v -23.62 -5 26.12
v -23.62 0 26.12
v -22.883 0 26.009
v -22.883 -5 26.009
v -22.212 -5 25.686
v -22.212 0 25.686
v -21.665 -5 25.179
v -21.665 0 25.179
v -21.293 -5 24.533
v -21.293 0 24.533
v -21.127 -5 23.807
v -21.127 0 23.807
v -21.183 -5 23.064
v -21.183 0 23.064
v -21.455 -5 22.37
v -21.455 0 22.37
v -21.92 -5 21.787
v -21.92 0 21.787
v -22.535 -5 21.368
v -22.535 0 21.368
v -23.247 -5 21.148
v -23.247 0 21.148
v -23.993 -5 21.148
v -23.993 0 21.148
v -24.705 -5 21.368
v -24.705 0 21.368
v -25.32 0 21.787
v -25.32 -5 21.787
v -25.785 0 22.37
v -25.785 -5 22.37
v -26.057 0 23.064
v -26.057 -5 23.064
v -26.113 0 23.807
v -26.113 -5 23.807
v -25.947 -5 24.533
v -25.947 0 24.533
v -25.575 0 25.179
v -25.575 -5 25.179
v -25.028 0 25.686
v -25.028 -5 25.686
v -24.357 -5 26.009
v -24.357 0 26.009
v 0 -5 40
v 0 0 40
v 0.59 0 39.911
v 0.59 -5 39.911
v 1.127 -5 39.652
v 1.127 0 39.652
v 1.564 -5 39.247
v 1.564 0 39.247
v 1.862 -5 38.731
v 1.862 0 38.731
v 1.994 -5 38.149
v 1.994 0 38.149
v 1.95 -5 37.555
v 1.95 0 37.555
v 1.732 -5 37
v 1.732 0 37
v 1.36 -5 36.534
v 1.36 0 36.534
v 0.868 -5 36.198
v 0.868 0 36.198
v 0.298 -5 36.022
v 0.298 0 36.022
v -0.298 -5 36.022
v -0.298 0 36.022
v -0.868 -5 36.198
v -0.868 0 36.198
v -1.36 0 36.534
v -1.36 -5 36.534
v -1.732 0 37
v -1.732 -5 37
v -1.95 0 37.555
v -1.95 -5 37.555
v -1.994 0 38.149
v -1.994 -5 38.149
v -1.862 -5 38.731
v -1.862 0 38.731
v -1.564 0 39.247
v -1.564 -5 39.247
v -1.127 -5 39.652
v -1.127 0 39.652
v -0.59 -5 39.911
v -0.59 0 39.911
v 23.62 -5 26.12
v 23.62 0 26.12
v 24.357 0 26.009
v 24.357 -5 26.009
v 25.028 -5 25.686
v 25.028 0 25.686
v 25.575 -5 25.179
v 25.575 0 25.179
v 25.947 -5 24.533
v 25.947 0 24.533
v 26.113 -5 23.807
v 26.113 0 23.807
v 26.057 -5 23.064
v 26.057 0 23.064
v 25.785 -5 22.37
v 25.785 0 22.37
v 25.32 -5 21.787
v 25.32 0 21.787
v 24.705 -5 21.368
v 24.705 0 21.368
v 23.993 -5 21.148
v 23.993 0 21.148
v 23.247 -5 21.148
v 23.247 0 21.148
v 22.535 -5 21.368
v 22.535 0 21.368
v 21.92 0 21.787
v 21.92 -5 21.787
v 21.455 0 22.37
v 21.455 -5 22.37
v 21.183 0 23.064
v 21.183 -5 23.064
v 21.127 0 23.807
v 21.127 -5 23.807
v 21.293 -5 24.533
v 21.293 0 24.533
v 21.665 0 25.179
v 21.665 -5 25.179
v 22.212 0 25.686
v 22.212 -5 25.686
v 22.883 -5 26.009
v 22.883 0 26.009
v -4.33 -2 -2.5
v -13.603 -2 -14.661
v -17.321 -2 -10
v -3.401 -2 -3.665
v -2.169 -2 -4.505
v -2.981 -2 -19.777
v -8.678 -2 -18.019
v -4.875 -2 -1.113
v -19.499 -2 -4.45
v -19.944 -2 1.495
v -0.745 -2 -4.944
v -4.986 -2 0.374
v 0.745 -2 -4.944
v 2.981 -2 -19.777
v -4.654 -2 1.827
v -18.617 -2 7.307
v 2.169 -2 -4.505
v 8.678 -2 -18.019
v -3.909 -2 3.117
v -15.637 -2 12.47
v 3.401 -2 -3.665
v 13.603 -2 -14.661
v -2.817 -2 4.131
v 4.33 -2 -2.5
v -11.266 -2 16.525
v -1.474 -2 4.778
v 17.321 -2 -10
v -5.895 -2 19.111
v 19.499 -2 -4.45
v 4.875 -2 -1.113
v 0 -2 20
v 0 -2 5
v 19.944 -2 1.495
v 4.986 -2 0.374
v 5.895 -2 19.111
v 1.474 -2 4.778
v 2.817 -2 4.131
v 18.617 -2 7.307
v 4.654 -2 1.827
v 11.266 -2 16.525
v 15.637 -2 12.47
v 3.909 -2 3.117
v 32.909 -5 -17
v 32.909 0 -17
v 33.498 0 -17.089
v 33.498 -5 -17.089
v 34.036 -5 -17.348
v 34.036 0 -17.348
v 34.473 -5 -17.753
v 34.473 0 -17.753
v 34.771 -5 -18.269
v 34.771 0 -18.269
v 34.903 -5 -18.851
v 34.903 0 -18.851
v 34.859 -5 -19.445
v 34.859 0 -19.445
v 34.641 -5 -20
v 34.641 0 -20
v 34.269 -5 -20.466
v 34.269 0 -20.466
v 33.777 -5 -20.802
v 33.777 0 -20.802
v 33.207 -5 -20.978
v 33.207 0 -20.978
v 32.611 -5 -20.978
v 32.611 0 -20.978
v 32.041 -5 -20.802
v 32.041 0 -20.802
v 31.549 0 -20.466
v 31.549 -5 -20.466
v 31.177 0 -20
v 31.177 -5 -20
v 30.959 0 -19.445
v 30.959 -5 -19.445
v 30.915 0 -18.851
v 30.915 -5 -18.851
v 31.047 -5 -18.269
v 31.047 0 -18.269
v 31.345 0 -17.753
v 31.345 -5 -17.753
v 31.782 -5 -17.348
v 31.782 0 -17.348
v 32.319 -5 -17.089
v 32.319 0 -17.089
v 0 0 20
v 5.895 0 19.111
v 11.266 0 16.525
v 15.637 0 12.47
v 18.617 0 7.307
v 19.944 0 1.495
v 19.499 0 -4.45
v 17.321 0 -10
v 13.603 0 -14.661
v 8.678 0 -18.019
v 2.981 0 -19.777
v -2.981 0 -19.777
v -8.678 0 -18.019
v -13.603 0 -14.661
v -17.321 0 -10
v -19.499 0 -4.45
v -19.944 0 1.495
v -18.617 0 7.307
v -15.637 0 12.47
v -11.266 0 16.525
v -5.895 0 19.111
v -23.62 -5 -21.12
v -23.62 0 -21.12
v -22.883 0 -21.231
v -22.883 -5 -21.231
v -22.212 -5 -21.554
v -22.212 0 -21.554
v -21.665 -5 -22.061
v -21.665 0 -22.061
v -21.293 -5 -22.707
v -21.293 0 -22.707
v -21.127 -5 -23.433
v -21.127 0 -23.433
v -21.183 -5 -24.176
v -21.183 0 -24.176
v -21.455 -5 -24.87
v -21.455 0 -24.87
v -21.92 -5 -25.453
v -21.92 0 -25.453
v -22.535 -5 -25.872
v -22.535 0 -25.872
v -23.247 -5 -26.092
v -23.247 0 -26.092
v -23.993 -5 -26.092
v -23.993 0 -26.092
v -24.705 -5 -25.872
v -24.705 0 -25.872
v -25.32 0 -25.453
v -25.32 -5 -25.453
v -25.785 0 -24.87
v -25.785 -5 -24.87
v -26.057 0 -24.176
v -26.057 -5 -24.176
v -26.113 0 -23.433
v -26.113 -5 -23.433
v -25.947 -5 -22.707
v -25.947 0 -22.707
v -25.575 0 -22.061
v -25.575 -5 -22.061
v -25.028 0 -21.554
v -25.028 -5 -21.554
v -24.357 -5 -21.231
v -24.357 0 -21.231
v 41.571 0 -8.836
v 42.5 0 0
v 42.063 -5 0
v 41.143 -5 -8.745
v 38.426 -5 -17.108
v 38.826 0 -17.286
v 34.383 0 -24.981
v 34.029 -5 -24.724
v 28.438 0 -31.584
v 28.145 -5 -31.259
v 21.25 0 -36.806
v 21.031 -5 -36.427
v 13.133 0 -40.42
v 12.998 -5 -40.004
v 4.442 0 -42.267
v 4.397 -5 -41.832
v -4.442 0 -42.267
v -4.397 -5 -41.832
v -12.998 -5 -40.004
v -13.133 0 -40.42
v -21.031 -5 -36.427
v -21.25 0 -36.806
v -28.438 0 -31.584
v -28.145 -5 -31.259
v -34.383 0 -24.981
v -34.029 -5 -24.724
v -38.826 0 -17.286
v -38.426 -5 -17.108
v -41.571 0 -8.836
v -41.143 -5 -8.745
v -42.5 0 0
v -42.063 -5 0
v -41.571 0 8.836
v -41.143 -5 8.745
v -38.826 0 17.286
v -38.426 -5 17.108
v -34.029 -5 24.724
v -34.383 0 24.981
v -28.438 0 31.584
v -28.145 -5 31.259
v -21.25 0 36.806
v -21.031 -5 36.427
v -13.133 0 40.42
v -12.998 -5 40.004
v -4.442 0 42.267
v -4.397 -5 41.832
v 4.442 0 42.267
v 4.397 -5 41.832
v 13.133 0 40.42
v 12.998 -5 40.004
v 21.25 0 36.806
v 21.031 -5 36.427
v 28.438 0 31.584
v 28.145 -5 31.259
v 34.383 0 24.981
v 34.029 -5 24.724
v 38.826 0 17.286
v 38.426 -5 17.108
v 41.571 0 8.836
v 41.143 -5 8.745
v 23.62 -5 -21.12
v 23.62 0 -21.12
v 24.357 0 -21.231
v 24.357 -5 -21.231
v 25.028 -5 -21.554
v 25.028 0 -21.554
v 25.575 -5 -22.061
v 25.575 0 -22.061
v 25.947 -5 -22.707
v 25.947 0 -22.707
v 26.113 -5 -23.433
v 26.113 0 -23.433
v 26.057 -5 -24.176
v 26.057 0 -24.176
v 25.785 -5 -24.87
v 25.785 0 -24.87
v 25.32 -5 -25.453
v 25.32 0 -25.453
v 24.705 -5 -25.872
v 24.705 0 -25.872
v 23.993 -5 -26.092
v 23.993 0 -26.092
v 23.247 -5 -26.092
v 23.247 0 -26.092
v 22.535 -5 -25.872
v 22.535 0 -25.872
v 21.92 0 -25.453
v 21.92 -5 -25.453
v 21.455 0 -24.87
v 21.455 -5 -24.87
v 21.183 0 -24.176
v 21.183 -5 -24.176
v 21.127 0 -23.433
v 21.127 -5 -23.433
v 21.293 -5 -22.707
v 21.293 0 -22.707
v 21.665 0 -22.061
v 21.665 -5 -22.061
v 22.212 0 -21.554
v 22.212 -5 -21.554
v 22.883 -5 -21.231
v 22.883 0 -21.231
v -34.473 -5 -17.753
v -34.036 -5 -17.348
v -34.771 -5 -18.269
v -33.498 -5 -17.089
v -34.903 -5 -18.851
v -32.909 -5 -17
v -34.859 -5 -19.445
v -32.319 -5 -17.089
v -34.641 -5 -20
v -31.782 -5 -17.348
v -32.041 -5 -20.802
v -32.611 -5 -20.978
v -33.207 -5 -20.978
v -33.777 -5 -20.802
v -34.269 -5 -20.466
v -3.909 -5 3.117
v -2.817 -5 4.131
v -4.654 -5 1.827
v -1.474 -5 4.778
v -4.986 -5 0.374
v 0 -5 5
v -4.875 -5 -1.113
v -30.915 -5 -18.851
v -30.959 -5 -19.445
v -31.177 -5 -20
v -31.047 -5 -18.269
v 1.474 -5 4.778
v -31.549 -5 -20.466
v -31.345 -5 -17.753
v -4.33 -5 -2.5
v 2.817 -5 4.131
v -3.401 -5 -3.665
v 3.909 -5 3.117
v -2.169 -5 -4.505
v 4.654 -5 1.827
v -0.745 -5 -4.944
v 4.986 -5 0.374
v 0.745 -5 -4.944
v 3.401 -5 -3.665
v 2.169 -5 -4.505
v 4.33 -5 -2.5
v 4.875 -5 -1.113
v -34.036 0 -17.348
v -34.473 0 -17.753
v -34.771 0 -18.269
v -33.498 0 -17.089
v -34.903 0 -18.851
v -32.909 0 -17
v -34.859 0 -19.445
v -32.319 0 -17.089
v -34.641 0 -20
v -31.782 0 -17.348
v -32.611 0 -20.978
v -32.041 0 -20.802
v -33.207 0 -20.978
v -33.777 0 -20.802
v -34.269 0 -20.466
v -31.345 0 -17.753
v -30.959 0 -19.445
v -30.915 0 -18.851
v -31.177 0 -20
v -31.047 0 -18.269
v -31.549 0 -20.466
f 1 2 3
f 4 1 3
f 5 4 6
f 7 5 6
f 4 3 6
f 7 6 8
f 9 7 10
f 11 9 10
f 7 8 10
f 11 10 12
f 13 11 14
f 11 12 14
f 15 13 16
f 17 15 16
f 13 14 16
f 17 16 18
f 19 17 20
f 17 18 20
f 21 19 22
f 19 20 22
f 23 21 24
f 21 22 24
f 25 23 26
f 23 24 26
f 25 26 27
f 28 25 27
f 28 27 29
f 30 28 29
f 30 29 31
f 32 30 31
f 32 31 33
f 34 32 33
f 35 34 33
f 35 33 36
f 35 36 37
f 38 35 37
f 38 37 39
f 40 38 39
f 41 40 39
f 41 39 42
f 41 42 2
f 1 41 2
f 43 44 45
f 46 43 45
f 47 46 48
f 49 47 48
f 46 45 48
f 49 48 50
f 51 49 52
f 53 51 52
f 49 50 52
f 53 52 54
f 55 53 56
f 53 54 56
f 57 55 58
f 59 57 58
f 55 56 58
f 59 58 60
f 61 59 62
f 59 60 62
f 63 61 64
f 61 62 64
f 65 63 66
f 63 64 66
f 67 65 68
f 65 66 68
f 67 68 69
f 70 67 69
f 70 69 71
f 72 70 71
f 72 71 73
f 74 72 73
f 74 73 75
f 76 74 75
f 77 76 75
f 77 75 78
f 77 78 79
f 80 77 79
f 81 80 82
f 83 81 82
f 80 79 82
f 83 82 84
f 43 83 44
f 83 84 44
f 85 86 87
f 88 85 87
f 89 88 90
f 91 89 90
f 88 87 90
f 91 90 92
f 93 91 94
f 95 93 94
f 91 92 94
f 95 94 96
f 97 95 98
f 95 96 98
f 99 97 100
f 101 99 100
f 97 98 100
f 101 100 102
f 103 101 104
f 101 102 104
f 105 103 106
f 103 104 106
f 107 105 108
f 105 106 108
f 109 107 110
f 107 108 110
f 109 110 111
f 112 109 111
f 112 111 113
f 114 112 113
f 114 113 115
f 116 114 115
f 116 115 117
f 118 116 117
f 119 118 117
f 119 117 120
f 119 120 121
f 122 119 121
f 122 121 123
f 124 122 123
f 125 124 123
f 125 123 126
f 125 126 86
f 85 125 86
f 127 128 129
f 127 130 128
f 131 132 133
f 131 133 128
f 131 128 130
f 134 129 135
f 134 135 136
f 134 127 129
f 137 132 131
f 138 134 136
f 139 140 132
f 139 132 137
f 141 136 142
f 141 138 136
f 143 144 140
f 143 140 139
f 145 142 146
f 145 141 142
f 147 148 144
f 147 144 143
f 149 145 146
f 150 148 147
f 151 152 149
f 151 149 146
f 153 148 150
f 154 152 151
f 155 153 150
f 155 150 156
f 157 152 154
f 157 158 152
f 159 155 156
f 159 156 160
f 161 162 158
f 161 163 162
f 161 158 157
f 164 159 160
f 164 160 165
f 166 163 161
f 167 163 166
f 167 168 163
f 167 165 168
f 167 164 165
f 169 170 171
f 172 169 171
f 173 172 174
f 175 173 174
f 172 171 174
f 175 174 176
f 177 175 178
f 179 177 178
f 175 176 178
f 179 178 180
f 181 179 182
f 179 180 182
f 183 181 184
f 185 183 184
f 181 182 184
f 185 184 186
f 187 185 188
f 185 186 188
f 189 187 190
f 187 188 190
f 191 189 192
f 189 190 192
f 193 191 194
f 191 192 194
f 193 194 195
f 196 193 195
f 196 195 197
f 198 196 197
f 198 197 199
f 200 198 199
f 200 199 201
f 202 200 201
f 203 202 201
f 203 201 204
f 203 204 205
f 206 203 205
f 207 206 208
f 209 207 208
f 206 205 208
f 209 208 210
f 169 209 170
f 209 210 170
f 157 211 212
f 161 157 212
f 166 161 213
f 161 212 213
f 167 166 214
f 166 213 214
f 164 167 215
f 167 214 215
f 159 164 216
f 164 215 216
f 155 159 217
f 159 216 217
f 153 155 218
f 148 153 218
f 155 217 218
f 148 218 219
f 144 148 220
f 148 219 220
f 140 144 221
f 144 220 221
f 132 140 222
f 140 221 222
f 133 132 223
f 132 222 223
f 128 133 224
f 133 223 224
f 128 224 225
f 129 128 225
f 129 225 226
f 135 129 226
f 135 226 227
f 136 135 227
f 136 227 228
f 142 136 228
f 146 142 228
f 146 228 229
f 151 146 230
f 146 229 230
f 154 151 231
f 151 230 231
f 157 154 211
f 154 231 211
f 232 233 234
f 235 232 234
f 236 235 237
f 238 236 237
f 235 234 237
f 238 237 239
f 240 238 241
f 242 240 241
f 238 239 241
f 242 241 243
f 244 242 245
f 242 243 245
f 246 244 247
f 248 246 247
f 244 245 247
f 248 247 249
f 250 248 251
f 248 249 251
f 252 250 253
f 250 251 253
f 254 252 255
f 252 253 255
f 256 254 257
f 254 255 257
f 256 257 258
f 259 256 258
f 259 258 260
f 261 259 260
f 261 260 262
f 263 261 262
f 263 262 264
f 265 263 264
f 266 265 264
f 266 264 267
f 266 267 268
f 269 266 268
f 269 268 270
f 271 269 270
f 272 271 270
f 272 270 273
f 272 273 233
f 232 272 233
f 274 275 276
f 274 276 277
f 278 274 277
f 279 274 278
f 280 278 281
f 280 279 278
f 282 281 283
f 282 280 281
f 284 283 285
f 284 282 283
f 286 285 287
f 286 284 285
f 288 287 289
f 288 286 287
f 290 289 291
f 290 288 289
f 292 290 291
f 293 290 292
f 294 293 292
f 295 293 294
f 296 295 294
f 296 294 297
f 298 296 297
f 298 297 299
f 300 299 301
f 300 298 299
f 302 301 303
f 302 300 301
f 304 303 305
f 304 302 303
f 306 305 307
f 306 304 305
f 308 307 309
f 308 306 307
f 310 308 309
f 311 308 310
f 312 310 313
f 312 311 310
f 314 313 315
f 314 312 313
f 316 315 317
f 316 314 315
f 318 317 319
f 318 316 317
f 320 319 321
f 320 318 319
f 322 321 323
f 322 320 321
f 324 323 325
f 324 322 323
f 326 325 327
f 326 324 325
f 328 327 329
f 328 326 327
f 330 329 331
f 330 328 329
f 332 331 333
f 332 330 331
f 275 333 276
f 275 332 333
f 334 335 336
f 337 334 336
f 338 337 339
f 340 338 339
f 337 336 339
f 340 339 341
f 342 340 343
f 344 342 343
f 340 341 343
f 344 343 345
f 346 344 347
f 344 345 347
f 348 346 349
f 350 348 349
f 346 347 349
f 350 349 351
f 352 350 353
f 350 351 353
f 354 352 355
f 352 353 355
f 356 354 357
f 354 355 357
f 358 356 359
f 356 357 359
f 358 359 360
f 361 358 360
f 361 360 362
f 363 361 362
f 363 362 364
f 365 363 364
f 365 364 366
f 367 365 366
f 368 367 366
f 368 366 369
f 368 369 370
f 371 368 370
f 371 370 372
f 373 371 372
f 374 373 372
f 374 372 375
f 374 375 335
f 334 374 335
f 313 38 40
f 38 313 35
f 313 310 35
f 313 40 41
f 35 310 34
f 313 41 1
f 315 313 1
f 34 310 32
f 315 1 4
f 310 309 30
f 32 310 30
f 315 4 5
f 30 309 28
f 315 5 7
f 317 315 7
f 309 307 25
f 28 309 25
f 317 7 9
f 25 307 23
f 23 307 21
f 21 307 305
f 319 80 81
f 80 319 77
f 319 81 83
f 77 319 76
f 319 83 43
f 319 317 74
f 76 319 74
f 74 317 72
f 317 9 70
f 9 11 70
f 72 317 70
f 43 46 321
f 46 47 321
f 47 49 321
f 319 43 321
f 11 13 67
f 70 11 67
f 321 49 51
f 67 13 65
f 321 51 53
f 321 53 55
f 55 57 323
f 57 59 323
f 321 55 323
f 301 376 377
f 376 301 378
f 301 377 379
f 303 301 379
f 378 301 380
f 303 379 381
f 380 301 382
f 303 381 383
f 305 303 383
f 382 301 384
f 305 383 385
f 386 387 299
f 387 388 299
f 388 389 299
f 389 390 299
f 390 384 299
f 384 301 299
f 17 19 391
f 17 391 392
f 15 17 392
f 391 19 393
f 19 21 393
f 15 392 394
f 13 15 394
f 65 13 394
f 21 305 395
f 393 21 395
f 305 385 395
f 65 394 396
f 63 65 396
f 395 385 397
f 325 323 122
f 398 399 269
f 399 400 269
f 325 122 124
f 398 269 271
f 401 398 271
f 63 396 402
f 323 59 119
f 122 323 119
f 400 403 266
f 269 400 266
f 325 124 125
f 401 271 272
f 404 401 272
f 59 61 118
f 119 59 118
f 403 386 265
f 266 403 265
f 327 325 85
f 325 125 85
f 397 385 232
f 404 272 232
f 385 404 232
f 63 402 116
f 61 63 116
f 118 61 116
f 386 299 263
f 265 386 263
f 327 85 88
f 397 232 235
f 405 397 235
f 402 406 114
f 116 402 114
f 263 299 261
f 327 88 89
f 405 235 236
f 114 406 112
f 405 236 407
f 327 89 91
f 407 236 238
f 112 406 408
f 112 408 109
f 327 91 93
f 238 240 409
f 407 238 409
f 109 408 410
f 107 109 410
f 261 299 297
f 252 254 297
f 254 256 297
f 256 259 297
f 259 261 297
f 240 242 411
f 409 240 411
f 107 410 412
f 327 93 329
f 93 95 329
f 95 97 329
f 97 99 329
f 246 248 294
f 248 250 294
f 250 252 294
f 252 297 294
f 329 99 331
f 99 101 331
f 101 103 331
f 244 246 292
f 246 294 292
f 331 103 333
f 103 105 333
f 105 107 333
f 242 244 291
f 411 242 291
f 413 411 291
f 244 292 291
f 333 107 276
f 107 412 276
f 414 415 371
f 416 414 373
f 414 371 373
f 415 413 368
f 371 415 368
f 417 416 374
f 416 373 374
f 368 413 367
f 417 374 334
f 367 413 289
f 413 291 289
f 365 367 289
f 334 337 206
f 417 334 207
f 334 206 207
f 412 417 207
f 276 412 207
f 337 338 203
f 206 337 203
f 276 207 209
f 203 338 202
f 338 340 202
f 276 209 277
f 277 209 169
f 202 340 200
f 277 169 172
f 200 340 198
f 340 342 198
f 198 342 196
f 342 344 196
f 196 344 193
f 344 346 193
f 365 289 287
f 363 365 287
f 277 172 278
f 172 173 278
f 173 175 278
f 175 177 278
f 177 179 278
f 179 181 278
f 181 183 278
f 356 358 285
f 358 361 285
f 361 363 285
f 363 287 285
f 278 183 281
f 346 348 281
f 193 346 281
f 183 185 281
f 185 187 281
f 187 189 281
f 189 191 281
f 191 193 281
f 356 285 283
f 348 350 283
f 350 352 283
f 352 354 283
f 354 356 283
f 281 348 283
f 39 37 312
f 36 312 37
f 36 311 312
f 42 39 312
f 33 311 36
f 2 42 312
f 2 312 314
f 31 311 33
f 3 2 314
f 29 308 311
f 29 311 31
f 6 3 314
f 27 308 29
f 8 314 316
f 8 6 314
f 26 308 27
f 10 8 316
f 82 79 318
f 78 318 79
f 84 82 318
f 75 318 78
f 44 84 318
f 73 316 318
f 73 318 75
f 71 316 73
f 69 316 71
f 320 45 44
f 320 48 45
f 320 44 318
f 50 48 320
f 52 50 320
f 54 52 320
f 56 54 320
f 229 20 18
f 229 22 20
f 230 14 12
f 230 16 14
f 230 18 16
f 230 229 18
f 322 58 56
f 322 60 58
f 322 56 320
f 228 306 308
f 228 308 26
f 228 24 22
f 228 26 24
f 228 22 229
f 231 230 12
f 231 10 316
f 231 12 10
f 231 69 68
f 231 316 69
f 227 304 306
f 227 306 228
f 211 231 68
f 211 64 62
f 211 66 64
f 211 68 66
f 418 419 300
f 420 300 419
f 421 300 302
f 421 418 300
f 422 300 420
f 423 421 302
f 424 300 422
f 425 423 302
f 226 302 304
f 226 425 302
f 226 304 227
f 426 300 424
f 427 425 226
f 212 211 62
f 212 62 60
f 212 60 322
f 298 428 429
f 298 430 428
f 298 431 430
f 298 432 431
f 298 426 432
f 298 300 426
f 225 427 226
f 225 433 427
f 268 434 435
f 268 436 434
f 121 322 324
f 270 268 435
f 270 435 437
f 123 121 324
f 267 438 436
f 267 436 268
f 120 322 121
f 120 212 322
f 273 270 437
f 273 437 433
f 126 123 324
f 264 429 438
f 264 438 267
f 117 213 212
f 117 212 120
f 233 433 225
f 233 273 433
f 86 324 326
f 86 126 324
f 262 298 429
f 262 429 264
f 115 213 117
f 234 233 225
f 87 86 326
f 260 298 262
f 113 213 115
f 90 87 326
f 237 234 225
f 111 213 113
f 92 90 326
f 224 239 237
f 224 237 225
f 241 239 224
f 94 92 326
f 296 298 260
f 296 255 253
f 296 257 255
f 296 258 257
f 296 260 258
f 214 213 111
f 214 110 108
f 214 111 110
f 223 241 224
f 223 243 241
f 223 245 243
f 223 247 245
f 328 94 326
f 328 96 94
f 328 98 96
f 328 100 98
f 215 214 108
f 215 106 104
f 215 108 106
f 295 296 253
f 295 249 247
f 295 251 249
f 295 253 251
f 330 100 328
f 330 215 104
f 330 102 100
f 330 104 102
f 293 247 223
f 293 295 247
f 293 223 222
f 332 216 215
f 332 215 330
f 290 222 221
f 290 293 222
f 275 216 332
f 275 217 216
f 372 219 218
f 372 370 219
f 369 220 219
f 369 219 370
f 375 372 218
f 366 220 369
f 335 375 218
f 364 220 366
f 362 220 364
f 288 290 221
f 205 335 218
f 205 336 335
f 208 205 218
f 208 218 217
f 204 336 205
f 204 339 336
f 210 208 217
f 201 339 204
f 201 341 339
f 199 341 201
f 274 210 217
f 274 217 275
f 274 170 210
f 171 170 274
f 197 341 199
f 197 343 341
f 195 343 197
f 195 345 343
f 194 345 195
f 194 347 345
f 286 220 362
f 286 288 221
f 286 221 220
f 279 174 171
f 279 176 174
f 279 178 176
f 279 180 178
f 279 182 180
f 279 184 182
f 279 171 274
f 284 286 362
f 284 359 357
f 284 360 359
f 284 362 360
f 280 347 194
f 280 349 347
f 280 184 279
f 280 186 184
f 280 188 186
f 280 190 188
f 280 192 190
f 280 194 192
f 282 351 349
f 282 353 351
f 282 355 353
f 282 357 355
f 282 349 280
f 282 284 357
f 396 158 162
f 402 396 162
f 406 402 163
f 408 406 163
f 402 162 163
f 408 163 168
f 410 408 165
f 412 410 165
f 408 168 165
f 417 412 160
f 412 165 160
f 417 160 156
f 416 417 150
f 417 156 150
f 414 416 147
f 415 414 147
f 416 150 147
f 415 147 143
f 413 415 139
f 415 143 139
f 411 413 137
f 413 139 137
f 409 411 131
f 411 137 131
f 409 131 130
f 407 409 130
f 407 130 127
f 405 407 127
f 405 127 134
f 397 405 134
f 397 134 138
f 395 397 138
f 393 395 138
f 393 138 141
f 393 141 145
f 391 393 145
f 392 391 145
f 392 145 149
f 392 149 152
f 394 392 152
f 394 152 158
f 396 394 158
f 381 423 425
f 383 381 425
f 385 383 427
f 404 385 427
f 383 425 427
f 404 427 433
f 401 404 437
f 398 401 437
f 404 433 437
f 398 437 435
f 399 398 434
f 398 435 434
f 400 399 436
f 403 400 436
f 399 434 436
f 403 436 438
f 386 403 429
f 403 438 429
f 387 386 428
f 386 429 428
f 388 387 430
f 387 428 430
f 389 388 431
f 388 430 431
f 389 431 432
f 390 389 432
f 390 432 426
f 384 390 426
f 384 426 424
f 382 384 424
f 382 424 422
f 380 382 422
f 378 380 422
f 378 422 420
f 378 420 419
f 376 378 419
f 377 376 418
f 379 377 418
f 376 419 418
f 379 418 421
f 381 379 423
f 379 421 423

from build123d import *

# Parameters (mm, degrees)
SKETCH1_R           = 42.5
BOSS_EXTRUDE1_DEPTH = 5
BOSS_EXTRUDE1_DRAFT = -5
SKETCH2_R           = 2.5
SKETCH2_R_2         = 5
CUT_EXTRUDE2_DEPTH  = 61.311690409
SKETCH3_R           = 20
CUT_EXTRUDE3_DEPTH  = 2
SKETCH5_R           = 2
CUT_EXTRUDE4_DEPTH  = 5


with BuildPart() as part:
    # Sketch1 → Boss-Extrude1 (with draft: the straight prism first)
    with BuildSketch(Plane(origin=(0, 0, 0), x_dir=(1, 0, 0), z_dir=(0, 1, 0))):
        Circle(SKETCH1_R)
    extrude(amount=-BOSS_EXTRUDE1_DEPTH)
    # Boss-Extrude1: the draft: its side faces are tilted about the plane it starts from
    boss_extrude1_sides = [part.faces().sort_by_distance(p)[0] for p in [
        (-42.5, -2.5, 0),
    ]]
    draft(boss_extrude1_sides, Plane(origin=(0, 0, 0), x_dir=(1, 0, 0), z_dir=(0, 1, 0)), BOSS_EXTRUDE1_DRAFT)

    # Sketch2 → Cut-Extrude2 (cut, through all)
    with BuildSketch(Plane(origin=(0, 0, 0), x_dir=(1, 0, 0), z_dir=(0, 1, 0))):
        with Locations(Location((23.62, 23.62, 0), (0, 0, 270))):
            Circle(SKETCH2_R)
        with Locations(Location((23.62, -23.62, 0), (0, 0, 270))):
            Circle(SKETCH2_R)
        with Locations(Location((-23.62, -23.62, 0), (0, 0, 270))):
            Circle(SKETCH2_R)
        with Locations(Location((-23.62, 23.62, 0), (0, 0, 270))):
            Circle(SKETCH2_R)
        with Locations(Location((0, 0, 0), (0, 0, 270))):
            Circle(SKETCH2_R_2)
    extrude(amount=-CUT_EXTRUDE2_DEPTH, mode=Mode.SUBTRACT)

    # Sketch3 → Cut-Extrude3 (cut)
    with BuildSketch(Plane(origin=(0, 0, 0), x_dir=(1, 0, 0), z_dir=(0, 1, 0))):
        with Locations(Location((0, 0, 0), (0, 0, 270))):
            Circle(SKETCH3_R)
    extrude(amount=-CUT_EXTRUDE3_DEPTH, mode=Mode.SUBTRACT)

    # Sketch5 → Cut-Extrude4 (cut)
    with BuildSketch(Plane(origin=(0, 0, 0), x_dir=(1, 0, 0), z_dir=(0, 1, 0))):
        with Locations(Location((0, -38, 0), (0, 0, 270))):
            Circle(SKETCH5_R)
        with Locations(Location((-32.908965344, 19, 0), (0, 0, 270))):
            Circle(SKETCH5_R)
        with Locations(Location((32.908965344, 19, 0), (0, 0, 270))):
            Circle(SKETCH5_R)
    extrude(amount=-CUT_EXTRUDE4_DEPTH, mode=Mode.SUBTRACT)


solid = part.part
